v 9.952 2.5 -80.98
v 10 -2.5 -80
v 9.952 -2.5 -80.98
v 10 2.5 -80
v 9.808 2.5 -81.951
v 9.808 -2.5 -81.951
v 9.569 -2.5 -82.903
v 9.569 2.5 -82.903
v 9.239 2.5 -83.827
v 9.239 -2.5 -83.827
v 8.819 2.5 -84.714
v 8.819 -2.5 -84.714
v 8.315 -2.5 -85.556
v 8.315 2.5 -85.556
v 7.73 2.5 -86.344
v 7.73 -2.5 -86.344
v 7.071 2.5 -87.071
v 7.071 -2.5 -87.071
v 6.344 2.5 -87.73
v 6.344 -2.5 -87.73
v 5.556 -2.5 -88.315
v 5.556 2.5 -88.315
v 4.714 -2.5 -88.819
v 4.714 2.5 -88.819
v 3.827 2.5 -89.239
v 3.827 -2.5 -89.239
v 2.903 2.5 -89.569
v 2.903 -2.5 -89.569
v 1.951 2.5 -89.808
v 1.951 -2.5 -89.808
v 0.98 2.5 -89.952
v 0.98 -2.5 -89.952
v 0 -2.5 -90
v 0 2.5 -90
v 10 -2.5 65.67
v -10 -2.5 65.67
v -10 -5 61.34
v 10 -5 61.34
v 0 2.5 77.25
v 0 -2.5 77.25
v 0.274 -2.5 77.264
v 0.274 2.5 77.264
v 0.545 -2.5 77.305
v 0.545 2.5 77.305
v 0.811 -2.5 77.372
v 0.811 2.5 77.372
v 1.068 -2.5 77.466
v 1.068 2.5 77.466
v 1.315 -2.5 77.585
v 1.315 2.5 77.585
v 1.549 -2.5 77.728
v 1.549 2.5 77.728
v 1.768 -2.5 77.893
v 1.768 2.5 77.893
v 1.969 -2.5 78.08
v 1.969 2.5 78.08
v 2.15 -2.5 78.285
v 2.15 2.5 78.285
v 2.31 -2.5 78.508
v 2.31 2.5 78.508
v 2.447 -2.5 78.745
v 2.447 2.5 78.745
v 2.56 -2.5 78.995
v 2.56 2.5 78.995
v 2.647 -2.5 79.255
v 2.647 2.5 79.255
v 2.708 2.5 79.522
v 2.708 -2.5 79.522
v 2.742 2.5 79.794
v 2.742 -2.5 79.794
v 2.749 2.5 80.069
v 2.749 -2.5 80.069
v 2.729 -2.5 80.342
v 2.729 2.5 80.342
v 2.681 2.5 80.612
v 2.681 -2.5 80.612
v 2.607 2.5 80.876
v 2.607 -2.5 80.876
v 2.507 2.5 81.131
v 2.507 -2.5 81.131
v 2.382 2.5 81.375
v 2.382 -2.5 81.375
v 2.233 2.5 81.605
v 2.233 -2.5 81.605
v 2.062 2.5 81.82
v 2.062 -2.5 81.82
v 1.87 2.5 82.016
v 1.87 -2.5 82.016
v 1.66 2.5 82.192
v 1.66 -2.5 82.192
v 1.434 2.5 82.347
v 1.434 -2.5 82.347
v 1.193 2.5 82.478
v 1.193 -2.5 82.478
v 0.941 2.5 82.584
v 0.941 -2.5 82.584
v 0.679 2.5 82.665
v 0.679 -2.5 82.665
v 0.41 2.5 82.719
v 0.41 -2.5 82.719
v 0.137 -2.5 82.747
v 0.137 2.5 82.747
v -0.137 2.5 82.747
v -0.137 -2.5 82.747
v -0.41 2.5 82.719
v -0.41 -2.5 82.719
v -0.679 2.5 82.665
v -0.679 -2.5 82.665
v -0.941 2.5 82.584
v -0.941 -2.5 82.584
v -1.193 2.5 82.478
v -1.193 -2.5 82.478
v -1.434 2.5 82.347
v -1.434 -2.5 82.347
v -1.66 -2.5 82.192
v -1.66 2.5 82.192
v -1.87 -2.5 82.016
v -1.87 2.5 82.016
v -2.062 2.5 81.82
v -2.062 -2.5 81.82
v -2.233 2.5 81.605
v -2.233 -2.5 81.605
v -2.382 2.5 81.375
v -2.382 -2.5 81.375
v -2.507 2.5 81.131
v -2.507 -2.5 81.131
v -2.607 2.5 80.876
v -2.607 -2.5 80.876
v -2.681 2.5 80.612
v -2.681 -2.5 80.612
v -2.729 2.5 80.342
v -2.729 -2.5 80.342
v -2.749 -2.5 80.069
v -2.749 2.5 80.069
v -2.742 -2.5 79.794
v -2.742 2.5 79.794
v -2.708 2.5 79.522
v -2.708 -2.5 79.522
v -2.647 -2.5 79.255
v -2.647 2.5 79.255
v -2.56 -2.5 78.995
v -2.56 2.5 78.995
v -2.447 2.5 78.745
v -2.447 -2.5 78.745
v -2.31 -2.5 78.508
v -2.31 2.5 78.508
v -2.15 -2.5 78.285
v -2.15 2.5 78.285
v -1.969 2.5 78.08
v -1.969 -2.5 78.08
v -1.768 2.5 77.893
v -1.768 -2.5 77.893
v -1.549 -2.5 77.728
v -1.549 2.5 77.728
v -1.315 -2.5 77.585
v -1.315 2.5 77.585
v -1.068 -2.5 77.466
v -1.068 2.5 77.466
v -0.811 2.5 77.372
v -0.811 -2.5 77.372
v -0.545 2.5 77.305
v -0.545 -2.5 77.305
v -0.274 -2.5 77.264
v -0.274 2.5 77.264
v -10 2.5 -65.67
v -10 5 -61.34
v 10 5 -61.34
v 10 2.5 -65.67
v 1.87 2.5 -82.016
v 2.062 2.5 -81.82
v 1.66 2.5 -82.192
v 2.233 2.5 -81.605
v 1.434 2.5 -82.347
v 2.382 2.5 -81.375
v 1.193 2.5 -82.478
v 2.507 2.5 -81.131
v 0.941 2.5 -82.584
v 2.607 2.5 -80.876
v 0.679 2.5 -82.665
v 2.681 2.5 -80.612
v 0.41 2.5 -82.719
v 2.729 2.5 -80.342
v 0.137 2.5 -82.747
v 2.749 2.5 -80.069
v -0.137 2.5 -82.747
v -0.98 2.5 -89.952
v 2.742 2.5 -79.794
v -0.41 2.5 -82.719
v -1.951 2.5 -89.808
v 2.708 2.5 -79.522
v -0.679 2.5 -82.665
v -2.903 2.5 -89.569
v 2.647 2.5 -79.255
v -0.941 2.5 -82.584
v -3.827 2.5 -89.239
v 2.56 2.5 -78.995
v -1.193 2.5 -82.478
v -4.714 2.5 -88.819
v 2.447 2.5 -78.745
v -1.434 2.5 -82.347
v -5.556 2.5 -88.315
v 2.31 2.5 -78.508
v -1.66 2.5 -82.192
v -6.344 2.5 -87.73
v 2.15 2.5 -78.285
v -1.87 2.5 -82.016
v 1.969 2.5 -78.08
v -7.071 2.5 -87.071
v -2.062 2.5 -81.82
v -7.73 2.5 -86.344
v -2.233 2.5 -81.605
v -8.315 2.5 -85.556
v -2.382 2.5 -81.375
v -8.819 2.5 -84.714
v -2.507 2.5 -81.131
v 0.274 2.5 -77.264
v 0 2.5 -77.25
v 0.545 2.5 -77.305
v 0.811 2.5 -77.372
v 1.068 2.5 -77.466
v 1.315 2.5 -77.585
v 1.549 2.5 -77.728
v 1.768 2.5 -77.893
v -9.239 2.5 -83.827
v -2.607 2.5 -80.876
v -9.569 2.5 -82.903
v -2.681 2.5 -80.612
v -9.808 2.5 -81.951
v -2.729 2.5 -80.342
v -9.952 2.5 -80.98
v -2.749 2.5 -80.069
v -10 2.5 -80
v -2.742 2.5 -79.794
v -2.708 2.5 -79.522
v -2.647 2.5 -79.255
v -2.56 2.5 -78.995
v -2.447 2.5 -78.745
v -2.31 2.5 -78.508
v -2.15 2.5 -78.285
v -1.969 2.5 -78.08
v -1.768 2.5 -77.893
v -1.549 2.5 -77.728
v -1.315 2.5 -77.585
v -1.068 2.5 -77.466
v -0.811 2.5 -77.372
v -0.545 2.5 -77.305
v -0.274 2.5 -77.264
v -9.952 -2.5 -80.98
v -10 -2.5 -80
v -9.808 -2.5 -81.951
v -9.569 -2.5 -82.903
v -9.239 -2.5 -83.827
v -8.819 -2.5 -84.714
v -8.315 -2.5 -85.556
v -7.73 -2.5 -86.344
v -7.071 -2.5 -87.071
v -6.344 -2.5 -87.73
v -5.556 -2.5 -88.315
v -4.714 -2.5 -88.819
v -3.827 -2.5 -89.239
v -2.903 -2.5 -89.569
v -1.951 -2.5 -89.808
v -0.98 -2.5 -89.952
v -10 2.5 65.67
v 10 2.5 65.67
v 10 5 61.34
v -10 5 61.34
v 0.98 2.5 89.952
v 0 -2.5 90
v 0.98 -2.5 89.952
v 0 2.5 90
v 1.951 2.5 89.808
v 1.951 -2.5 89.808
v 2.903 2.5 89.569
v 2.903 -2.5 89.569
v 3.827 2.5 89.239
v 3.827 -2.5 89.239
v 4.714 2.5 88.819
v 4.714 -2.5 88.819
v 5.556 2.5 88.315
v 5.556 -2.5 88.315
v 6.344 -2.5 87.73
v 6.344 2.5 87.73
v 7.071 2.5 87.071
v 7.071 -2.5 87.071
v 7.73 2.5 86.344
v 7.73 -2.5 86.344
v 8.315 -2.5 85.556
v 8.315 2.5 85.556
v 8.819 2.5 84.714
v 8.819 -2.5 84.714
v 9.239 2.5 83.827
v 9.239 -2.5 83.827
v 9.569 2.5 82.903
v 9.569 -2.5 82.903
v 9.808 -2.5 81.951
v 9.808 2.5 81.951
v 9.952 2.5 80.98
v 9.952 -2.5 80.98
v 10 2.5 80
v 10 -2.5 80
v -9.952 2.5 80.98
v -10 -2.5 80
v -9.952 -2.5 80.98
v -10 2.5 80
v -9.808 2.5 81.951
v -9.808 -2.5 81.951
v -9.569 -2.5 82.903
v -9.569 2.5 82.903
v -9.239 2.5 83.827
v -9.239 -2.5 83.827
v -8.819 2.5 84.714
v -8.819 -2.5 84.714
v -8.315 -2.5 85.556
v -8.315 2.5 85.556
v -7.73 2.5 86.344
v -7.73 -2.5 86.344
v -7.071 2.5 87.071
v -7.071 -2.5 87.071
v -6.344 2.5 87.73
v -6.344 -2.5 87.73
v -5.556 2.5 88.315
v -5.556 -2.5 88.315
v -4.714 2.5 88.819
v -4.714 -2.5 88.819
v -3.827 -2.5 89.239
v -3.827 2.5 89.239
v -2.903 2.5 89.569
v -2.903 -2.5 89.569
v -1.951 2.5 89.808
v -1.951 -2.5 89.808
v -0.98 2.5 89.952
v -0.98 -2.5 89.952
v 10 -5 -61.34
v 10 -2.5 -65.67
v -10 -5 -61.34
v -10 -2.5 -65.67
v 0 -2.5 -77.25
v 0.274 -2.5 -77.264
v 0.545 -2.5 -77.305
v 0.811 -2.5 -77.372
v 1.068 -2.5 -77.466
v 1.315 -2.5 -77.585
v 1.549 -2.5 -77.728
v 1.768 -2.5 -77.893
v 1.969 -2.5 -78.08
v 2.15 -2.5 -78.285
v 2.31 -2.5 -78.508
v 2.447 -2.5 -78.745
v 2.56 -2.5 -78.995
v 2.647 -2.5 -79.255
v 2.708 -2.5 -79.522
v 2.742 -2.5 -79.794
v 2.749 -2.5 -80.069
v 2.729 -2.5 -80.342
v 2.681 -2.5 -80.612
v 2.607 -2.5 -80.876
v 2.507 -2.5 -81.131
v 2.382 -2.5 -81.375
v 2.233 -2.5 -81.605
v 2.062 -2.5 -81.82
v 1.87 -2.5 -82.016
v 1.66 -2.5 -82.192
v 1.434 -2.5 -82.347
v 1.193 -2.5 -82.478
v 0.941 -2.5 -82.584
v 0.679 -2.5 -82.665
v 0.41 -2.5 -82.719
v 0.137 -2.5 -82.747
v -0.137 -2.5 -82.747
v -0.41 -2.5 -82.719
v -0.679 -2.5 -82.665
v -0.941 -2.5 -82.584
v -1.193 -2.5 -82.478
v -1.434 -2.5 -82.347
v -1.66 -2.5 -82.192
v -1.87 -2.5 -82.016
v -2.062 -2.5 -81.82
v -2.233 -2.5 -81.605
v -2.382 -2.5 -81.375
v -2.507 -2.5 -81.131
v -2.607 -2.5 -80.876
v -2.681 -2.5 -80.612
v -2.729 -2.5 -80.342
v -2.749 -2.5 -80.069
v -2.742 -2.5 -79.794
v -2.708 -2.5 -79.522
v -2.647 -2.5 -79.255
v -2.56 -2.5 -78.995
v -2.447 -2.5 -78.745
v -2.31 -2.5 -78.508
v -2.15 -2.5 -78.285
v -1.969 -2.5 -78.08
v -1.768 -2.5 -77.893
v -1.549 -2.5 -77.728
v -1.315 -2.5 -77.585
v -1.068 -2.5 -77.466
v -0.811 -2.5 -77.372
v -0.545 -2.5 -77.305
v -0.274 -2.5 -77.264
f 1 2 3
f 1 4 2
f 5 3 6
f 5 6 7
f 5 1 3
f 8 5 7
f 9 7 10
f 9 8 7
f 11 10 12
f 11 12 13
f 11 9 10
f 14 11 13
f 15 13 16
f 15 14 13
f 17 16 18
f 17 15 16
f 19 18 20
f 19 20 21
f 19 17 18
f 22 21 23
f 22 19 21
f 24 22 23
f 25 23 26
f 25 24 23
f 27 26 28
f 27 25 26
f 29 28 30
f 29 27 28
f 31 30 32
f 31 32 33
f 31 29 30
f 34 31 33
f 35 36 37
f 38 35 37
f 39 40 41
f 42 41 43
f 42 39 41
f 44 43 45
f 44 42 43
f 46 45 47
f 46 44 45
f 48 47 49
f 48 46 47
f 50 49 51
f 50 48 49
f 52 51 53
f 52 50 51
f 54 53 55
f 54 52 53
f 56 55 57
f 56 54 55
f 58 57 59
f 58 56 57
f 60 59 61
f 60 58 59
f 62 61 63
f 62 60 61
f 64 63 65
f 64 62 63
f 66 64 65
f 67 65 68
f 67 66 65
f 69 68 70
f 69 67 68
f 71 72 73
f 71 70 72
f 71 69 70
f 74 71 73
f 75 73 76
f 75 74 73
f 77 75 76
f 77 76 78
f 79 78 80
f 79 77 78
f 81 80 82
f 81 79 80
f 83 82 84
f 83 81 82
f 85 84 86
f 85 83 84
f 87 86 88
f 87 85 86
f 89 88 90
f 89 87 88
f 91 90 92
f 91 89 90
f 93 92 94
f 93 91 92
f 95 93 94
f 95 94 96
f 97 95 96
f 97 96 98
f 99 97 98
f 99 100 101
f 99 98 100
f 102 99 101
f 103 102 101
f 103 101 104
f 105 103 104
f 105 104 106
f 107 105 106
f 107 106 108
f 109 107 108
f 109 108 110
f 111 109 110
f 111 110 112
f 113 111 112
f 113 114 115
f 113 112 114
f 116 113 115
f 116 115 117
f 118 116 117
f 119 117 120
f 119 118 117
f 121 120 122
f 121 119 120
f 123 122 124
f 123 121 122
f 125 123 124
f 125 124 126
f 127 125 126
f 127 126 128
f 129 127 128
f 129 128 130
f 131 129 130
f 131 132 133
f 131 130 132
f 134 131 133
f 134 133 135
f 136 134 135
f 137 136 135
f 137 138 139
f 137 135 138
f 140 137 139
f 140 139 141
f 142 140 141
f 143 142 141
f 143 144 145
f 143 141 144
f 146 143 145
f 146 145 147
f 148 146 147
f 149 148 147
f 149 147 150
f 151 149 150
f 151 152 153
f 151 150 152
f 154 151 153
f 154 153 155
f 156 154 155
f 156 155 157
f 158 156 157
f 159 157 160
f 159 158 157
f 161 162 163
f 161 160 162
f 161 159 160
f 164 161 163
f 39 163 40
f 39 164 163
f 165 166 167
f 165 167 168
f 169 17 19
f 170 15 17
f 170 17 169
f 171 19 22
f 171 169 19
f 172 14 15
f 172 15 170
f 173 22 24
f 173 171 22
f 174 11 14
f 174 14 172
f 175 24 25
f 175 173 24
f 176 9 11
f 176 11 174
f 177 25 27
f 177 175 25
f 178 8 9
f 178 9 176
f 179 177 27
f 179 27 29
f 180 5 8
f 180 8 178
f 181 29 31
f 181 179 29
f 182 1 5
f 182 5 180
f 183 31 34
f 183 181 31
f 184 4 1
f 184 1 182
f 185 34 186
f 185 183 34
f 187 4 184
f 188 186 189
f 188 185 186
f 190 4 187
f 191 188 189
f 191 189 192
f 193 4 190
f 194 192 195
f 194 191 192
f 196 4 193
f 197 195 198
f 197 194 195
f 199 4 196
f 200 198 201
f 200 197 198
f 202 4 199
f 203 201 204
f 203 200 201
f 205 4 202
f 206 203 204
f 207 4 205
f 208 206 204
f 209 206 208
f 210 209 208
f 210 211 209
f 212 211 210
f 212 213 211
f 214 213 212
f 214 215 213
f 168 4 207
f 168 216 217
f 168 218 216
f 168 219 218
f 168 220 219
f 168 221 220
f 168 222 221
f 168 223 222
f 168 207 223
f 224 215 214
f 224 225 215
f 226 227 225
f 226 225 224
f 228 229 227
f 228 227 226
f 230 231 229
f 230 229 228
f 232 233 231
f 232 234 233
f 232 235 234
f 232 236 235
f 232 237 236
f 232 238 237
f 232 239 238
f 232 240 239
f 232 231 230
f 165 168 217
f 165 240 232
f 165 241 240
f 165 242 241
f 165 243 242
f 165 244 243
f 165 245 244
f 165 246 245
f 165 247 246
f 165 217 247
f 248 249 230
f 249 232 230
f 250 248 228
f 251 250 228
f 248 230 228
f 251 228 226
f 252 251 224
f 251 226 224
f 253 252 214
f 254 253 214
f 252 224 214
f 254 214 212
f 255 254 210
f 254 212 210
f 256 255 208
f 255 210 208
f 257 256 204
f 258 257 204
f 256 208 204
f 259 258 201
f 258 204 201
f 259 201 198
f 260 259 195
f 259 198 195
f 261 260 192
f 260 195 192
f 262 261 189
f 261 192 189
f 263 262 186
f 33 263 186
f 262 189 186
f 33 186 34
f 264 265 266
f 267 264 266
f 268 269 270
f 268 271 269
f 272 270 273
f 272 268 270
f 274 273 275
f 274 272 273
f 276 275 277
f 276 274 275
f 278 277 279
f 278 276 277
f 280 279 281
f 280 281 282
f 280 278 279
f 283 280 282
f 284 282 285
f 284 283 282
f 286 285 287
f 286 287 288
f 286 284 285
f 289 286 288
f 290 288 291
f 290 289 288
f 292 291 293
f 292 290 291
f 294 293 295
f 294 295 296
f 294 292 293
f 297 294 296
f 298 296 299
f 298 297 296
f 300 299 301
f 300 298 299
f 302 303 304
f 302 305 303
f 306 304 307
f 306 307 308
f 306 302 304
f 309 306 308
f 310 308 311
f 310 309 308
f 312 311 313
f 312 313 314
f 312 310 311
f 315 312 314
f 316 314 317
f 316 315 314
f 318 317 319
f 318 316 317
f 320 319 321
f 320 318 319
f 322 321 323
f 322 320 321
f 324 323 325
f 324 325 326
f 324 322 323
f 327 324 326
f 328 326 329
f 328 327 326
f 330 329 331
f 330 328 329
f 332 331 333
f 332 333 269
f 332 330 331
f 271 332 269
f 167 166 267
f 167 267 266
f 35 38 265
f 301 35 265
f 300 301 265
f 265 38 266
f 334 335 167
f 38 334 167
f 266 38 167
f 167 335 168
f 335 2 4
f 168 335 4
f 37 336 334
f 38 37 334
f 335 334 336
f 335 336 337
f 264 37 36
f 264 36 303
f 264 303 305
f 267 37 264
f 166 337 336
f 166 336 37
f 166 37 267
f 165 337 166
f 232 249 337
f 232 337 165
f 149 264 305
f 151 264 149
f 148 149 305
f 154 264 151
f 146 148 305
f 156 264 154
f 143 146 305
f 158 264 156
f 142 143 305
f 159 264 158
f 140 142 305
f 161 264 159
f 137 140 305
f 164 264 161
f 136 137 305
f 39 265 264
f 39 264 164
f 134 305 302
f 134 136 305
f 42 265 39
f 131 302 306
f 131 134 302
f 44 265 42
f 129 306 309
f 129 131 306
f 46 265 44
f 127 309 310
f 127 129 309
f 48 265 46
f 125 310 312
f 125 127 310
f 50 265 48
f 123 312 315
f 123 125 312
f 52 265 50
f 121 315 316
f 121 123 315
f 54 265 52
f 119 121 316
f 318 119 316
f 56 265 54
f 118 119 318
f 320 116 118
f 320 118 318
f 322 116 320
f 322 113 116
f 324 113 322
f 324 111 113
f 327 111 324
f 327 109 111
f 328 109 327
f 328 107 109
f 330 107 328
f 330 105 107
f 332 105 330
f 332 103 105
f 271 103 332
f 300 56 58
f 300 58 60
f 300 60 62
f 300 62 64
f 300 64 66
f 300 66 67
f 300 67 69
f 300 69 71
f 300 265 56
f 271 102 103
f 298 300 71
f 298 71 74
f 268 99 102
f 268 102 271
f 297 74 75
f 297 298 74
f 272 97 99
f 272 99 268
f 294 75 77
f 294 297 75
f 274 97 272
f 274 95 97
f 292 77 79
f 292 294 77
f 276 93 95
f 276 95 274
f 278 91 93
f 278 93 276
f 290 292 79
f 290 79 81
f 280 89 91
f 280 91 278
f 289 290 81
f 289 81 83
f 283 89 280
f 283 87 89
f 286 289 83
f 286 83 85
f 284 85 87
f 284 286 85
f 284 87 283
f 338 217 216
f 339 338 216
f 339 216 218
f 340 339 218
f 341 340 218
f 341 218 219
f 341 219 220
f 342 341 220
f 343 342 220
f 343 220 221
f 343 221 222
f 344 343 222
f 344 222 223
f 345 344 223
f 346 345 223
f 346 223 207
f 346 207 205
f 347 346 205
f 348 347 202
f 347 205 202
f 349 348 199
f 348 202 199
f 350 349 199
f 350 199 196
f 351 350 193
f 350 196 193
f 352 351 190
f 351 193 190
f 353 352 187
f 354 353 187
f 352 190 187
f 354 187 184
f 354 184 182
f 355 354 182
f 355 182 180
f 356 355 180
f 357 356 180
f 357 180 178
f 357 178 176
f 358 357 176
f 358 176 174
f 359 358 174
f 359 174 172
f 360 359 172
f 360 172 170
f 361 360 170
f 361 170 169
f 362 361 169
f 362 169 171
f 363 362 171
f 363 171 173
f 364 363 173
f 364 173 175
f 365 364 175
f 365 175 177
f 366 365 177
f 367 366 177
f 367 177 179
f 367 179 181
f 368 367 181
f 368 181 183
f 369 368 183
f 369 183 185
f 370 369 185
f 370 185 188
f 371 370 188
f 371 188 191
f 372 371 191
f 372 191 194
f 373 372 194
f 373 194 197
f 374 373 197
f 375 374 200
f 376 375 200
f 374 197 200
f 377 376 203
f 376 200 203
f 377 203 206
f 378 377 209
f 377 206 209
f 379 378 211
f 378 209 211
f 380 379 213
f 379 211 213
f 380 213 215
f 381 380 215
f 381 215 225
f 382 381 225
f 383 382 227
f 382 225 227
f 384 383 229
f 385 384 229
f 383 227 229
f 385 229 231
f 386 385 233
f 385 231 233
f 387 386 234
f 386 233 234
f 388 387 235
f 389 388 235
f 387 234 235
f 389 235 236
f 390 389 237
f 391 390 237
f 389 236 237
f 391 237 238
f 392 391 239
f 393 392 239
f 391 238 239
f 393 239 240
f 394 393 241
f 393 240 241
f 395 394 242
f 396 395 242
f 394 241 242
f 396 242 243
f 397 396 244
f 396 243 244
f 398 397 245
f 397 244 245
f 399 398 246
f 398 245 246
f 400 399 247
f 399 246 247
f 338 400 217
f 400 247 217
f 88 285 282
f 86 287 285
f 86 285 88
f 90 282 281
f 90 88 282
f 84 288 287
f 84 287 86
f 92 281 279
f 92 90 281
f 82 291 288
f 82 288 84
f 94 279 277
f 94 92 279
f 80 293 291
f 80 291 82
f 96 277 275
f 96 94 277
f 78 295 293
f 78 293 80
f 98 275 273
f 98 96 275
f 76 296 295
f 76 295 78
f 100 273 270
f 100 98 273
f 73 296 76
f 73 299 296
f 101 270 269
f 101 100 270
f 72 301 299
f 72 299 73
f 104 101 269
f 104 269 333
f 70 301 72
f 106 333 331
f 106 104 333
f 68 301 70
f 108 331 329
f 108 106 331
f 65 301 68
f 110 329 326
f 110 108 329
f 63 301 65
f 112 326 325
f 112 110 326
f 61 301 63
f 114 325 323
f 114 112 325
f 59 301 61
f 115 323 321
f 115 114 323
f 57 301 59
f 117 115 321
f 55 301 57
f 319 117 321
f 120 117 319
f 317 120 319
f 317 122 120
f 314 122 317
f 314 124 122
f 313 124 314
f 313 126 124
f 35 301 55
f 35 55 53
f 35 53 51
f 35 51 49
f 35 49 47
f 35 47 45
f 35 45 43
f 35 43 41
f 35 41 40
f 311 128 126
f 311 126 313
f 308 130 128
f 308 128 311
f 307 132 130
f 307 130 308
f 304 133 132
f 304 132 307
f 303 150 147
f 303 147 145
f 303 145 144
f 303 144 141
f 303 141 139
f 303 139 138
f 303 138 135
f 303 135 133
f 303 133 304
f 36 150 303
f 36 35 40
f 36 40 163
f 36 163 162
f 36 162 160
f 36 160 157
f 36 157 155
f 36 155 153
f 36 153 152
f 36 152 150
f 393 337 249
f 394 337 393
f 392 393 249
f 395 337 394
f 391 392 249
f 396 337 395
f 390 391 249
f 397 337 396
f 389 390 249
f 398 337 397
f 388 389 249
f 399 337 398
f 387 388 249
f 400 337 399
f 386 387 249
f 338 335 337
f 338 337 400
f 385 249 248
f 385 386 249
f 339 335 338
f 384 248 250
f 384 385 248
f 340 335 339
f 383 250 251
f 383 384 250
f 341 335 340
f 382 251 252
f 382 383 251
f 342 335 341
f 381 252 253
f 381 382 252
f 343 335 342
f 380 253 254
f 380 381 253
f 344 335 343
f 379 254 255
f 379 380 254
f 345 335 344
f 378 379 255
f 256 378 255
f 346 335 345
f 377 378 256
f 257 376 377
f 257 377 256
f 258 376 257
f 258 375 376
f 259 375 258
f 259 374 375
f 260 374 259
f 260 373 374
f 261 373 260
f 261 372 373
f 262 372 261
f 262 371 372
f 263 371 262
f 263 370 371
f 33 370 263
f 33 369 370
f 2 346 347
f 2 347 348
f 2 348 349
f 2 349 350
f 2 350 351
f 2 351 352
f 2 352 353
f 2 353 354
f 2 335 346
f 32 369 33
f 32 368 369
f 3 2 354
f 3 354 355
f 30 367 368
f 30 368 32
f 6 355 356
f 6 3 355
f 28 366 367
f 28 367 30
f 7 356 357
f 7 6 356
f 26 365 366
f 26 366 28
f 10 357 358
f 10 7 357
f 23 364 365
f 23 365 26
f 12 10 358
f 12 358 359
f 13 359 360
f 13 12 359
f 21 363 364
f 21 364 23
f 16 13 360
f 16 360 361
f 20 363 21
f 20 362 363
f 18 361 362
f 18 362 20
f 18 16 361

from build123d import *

# Parameters (mm, degrees)
BOSS_EXTRUDE1_DEPTH      = 70
BOSS_EXTRUDE1_DEPTH_BACK = 70
SKETCH1_W                = 20
SKETCH1_H                = 10
SKETCH3_W                = 20
SKETCH3_H                = 5
BOSS_EXTRUDE2_DEPTH      = 20
FILLET1_R                = 10
SKETCH4_R                = 2.75
CUT_EXTRUDE1_DEPTH       = 91.863909227
FILLET1_OF_MIRROR1_R     = 10
CHAMFER1_SIZE            = 8.660254038
CHAMFER1_SIZE_2          = 5


# Some blends are built 0.0001 mm under size
with BuildPart() as part:
    # Sketch1 → Boss-Extrude1 (new, two sides: drawn at the far end of the back side and taken through both)
    with BuildSketch(Plane.XY.offset(-BOSS_EXTRUDE1_DEPTH_BACK)):
        Rectangle(SKETCH1_W, SKETCH1_H)
    extrude(amount=BOSS_EXTRUDE1_DEPTH + BOSS_EXTRUDE1_DEPTH_BACK)

    # Sketch3 → Boss-Extrude2 (add)
    with BuildSketch(Plane(origin=(0, 0, -70), x_dir=(-1, 0, 0), z_dir=(0, 0, -1))):
        Rectangle(SKETCH3_W, SKETCH3_H)
    boss_extrude2 = extrude(amount=BOSS_EXTRUDE2_DEPTH)

    # Fillet1
    fillet1_edges = [part.edges().sort_by_distance(p)[0] for p in [
        (-10, 0, -90),
        (10, 0, -90),
    ]]
    fillet(fillet1_edges, radius=FILLET1_R - 0.0001)  # a hair under: the kernel refuses the full size

    # Sketch4 → Cut-Extrude1 (cut, through all)
    with BuildSketch(Plane(origin=(0, 2.5, 0), x_dir=(1, 0, 0), z_dir=(0, 1, 0))):
        with Locations(Location((0, 80, 0), (0, 0, 270))):
            Circle(SKETCH4_R)
    cut_extrude1 = extrude(amount=-CUT_EXTRUDE1_DEPTH, mode=Mode.SUBTRACT)

    # Mirror1: Boss-Extrude2, Cut-Extrude1 across plane
    add(boss_extrude2.mirror(Plane.XY))
    add(cut_extrude1.mirror(Plane.XY), mode=Mode.SUBTRACT)

    # Fillet1 of Mirror1
    fillet1_of_mirror1_edges = [part.edges().sort_by_distance(p)[0] for p in [
        (-10, 0, 90),
        (10, 0, 90),
    ]]
    fillet(fillet1_of_mirror1_edges, radius=FILLET1_OF_MIRROR1_R - 0.0001)  # a hair under: the kernel refuses the full size

    # Chamfer1
    # the kernel refuses this chamfer: 8.660254038, 5 mm, written as the material it takes off along each edge
    with BuildSketch(Plane(origin=(32.404819853, 5, -70), x_dir=(0, 0.019326765612700594, 0.999813220622208), z_dir=(-1, 0, 0))) as chamfer1_piece_1_section:
        Polygon((CHAMFER1_SIZE * 0.999813220604, -CHAMFER1_SIZE * 0.0193267656124), (-CHAMFER1_SIZE_2 * 0.0193267656127, -CHAMFER1_SIZE_2 * 0.999813220622), (0, 0), align=None)
    chamfer1_piece_1 = extrude(amount=64.809639706, mode=Mode.PRIVATE)
    chamfer1_piece_1 = split(chamfer1_piece_1, bisect_by=Plane(origin=(0, 2.5, -66.539331058), z_dir=(0, 1, 0)), keep=Keep.TOP, mode=Mode.PRIVATE)
    add(chamfer1_piece_1, mode=Mode.SUBTRACT)
    with BuildSketch(Plane(origin=(-32.404819853, -5, -70), x_dir=(0, -0.019326765612700594, 0.999813220622208), z_dir=(1, 0, 0))) as chamfer1_piece_2_section:
        Polygon((CHAMFER1_SIZE * 0.999813220604, -CHAMFER1_SIZE * 0.0193267656124), (-CHAMFER1_SIZE_2 * 0.0193267656127, -CHAMFER1_SIZE_2 * 0.999813220622), (0, 0), align=None)
    chamfer1_piece_2 = extrude(amount=64.809639706, mode=Mode.PRIVATE)
    chamfer1_piece_2 = split(chamfer1_piece_2, bisect_by=Plane(origin=(0, -2.5, -66.539331058), z_dir=(0, -1, 0)), keep=Keep.TOP, mode=Mode.PRIVATE)
    add(chamfer1_piece_2, mode=Mode.SUBTRACT)
    with BuildSketch(Plane(origin=(-32.404819853, -5, 70), x_dir=(0, 0.9983227437537926, 0.05789386240267045), z_dir=(1, 0, 0))) as chamfer1_piece_3_section:
        Polygon((CHAMFER1_SIZE_2 * 0.998322743754, -CHAMFER1_SIZE_2 * 0.0578938624027), (-CHAMFER1_SIZE * 0.0578938624016, -CHAMFER1_SIZE * 0.998322743736), (0, 0), align=None)
    chamfer1_piece_3 = extrude(amount=64.809639706, mode=Mode.PRIVATE)
    chamfer1_piece_3 = split(chamfer1_piece_3, bisect_by=Plane(origin=(0, -2.5, 66.539331058), z_dir=(0, -1, 0)), keep=Keep.TOP, mode=Mode.PRIVATE)
    add(chamfer1_piece_3, mode=Mode.SUBTRACT)
    with BuildSketch(Plane(origin=(32.404819853, 5, 70), x_dir=(0, -0.9983227437537926, 0.05789386240267045), z_dir=(-1, 0, 0))) as chamfer1_piece_4_section:
        Polygon((CHAMFER1_SIZE_2 * 0.998322743754, -CHAMFER1_SIZE_2 * 0.0578938624027), (-CHAMFER1_SIZE * 0.0578938624016, -CHAMFER1_SIZE * 0.998322743736), (0, 0), align=None)
    chamfer1_piece_4 = extrude(amount=64.809639706, mode=Mode.PRIVATE)
    chamfer1_piece_4 = split(chamfer1_piece_4, bisect_by=Plane(origin=(0, 2.5, 66.539331058), z_dir=(0, 1, 0)), keep=Keep.TOP, mode=Mode.PRIVATE)
    add(chamfer1_piece_4, mode=Mode.SUBTRACT)


solid = part.part
